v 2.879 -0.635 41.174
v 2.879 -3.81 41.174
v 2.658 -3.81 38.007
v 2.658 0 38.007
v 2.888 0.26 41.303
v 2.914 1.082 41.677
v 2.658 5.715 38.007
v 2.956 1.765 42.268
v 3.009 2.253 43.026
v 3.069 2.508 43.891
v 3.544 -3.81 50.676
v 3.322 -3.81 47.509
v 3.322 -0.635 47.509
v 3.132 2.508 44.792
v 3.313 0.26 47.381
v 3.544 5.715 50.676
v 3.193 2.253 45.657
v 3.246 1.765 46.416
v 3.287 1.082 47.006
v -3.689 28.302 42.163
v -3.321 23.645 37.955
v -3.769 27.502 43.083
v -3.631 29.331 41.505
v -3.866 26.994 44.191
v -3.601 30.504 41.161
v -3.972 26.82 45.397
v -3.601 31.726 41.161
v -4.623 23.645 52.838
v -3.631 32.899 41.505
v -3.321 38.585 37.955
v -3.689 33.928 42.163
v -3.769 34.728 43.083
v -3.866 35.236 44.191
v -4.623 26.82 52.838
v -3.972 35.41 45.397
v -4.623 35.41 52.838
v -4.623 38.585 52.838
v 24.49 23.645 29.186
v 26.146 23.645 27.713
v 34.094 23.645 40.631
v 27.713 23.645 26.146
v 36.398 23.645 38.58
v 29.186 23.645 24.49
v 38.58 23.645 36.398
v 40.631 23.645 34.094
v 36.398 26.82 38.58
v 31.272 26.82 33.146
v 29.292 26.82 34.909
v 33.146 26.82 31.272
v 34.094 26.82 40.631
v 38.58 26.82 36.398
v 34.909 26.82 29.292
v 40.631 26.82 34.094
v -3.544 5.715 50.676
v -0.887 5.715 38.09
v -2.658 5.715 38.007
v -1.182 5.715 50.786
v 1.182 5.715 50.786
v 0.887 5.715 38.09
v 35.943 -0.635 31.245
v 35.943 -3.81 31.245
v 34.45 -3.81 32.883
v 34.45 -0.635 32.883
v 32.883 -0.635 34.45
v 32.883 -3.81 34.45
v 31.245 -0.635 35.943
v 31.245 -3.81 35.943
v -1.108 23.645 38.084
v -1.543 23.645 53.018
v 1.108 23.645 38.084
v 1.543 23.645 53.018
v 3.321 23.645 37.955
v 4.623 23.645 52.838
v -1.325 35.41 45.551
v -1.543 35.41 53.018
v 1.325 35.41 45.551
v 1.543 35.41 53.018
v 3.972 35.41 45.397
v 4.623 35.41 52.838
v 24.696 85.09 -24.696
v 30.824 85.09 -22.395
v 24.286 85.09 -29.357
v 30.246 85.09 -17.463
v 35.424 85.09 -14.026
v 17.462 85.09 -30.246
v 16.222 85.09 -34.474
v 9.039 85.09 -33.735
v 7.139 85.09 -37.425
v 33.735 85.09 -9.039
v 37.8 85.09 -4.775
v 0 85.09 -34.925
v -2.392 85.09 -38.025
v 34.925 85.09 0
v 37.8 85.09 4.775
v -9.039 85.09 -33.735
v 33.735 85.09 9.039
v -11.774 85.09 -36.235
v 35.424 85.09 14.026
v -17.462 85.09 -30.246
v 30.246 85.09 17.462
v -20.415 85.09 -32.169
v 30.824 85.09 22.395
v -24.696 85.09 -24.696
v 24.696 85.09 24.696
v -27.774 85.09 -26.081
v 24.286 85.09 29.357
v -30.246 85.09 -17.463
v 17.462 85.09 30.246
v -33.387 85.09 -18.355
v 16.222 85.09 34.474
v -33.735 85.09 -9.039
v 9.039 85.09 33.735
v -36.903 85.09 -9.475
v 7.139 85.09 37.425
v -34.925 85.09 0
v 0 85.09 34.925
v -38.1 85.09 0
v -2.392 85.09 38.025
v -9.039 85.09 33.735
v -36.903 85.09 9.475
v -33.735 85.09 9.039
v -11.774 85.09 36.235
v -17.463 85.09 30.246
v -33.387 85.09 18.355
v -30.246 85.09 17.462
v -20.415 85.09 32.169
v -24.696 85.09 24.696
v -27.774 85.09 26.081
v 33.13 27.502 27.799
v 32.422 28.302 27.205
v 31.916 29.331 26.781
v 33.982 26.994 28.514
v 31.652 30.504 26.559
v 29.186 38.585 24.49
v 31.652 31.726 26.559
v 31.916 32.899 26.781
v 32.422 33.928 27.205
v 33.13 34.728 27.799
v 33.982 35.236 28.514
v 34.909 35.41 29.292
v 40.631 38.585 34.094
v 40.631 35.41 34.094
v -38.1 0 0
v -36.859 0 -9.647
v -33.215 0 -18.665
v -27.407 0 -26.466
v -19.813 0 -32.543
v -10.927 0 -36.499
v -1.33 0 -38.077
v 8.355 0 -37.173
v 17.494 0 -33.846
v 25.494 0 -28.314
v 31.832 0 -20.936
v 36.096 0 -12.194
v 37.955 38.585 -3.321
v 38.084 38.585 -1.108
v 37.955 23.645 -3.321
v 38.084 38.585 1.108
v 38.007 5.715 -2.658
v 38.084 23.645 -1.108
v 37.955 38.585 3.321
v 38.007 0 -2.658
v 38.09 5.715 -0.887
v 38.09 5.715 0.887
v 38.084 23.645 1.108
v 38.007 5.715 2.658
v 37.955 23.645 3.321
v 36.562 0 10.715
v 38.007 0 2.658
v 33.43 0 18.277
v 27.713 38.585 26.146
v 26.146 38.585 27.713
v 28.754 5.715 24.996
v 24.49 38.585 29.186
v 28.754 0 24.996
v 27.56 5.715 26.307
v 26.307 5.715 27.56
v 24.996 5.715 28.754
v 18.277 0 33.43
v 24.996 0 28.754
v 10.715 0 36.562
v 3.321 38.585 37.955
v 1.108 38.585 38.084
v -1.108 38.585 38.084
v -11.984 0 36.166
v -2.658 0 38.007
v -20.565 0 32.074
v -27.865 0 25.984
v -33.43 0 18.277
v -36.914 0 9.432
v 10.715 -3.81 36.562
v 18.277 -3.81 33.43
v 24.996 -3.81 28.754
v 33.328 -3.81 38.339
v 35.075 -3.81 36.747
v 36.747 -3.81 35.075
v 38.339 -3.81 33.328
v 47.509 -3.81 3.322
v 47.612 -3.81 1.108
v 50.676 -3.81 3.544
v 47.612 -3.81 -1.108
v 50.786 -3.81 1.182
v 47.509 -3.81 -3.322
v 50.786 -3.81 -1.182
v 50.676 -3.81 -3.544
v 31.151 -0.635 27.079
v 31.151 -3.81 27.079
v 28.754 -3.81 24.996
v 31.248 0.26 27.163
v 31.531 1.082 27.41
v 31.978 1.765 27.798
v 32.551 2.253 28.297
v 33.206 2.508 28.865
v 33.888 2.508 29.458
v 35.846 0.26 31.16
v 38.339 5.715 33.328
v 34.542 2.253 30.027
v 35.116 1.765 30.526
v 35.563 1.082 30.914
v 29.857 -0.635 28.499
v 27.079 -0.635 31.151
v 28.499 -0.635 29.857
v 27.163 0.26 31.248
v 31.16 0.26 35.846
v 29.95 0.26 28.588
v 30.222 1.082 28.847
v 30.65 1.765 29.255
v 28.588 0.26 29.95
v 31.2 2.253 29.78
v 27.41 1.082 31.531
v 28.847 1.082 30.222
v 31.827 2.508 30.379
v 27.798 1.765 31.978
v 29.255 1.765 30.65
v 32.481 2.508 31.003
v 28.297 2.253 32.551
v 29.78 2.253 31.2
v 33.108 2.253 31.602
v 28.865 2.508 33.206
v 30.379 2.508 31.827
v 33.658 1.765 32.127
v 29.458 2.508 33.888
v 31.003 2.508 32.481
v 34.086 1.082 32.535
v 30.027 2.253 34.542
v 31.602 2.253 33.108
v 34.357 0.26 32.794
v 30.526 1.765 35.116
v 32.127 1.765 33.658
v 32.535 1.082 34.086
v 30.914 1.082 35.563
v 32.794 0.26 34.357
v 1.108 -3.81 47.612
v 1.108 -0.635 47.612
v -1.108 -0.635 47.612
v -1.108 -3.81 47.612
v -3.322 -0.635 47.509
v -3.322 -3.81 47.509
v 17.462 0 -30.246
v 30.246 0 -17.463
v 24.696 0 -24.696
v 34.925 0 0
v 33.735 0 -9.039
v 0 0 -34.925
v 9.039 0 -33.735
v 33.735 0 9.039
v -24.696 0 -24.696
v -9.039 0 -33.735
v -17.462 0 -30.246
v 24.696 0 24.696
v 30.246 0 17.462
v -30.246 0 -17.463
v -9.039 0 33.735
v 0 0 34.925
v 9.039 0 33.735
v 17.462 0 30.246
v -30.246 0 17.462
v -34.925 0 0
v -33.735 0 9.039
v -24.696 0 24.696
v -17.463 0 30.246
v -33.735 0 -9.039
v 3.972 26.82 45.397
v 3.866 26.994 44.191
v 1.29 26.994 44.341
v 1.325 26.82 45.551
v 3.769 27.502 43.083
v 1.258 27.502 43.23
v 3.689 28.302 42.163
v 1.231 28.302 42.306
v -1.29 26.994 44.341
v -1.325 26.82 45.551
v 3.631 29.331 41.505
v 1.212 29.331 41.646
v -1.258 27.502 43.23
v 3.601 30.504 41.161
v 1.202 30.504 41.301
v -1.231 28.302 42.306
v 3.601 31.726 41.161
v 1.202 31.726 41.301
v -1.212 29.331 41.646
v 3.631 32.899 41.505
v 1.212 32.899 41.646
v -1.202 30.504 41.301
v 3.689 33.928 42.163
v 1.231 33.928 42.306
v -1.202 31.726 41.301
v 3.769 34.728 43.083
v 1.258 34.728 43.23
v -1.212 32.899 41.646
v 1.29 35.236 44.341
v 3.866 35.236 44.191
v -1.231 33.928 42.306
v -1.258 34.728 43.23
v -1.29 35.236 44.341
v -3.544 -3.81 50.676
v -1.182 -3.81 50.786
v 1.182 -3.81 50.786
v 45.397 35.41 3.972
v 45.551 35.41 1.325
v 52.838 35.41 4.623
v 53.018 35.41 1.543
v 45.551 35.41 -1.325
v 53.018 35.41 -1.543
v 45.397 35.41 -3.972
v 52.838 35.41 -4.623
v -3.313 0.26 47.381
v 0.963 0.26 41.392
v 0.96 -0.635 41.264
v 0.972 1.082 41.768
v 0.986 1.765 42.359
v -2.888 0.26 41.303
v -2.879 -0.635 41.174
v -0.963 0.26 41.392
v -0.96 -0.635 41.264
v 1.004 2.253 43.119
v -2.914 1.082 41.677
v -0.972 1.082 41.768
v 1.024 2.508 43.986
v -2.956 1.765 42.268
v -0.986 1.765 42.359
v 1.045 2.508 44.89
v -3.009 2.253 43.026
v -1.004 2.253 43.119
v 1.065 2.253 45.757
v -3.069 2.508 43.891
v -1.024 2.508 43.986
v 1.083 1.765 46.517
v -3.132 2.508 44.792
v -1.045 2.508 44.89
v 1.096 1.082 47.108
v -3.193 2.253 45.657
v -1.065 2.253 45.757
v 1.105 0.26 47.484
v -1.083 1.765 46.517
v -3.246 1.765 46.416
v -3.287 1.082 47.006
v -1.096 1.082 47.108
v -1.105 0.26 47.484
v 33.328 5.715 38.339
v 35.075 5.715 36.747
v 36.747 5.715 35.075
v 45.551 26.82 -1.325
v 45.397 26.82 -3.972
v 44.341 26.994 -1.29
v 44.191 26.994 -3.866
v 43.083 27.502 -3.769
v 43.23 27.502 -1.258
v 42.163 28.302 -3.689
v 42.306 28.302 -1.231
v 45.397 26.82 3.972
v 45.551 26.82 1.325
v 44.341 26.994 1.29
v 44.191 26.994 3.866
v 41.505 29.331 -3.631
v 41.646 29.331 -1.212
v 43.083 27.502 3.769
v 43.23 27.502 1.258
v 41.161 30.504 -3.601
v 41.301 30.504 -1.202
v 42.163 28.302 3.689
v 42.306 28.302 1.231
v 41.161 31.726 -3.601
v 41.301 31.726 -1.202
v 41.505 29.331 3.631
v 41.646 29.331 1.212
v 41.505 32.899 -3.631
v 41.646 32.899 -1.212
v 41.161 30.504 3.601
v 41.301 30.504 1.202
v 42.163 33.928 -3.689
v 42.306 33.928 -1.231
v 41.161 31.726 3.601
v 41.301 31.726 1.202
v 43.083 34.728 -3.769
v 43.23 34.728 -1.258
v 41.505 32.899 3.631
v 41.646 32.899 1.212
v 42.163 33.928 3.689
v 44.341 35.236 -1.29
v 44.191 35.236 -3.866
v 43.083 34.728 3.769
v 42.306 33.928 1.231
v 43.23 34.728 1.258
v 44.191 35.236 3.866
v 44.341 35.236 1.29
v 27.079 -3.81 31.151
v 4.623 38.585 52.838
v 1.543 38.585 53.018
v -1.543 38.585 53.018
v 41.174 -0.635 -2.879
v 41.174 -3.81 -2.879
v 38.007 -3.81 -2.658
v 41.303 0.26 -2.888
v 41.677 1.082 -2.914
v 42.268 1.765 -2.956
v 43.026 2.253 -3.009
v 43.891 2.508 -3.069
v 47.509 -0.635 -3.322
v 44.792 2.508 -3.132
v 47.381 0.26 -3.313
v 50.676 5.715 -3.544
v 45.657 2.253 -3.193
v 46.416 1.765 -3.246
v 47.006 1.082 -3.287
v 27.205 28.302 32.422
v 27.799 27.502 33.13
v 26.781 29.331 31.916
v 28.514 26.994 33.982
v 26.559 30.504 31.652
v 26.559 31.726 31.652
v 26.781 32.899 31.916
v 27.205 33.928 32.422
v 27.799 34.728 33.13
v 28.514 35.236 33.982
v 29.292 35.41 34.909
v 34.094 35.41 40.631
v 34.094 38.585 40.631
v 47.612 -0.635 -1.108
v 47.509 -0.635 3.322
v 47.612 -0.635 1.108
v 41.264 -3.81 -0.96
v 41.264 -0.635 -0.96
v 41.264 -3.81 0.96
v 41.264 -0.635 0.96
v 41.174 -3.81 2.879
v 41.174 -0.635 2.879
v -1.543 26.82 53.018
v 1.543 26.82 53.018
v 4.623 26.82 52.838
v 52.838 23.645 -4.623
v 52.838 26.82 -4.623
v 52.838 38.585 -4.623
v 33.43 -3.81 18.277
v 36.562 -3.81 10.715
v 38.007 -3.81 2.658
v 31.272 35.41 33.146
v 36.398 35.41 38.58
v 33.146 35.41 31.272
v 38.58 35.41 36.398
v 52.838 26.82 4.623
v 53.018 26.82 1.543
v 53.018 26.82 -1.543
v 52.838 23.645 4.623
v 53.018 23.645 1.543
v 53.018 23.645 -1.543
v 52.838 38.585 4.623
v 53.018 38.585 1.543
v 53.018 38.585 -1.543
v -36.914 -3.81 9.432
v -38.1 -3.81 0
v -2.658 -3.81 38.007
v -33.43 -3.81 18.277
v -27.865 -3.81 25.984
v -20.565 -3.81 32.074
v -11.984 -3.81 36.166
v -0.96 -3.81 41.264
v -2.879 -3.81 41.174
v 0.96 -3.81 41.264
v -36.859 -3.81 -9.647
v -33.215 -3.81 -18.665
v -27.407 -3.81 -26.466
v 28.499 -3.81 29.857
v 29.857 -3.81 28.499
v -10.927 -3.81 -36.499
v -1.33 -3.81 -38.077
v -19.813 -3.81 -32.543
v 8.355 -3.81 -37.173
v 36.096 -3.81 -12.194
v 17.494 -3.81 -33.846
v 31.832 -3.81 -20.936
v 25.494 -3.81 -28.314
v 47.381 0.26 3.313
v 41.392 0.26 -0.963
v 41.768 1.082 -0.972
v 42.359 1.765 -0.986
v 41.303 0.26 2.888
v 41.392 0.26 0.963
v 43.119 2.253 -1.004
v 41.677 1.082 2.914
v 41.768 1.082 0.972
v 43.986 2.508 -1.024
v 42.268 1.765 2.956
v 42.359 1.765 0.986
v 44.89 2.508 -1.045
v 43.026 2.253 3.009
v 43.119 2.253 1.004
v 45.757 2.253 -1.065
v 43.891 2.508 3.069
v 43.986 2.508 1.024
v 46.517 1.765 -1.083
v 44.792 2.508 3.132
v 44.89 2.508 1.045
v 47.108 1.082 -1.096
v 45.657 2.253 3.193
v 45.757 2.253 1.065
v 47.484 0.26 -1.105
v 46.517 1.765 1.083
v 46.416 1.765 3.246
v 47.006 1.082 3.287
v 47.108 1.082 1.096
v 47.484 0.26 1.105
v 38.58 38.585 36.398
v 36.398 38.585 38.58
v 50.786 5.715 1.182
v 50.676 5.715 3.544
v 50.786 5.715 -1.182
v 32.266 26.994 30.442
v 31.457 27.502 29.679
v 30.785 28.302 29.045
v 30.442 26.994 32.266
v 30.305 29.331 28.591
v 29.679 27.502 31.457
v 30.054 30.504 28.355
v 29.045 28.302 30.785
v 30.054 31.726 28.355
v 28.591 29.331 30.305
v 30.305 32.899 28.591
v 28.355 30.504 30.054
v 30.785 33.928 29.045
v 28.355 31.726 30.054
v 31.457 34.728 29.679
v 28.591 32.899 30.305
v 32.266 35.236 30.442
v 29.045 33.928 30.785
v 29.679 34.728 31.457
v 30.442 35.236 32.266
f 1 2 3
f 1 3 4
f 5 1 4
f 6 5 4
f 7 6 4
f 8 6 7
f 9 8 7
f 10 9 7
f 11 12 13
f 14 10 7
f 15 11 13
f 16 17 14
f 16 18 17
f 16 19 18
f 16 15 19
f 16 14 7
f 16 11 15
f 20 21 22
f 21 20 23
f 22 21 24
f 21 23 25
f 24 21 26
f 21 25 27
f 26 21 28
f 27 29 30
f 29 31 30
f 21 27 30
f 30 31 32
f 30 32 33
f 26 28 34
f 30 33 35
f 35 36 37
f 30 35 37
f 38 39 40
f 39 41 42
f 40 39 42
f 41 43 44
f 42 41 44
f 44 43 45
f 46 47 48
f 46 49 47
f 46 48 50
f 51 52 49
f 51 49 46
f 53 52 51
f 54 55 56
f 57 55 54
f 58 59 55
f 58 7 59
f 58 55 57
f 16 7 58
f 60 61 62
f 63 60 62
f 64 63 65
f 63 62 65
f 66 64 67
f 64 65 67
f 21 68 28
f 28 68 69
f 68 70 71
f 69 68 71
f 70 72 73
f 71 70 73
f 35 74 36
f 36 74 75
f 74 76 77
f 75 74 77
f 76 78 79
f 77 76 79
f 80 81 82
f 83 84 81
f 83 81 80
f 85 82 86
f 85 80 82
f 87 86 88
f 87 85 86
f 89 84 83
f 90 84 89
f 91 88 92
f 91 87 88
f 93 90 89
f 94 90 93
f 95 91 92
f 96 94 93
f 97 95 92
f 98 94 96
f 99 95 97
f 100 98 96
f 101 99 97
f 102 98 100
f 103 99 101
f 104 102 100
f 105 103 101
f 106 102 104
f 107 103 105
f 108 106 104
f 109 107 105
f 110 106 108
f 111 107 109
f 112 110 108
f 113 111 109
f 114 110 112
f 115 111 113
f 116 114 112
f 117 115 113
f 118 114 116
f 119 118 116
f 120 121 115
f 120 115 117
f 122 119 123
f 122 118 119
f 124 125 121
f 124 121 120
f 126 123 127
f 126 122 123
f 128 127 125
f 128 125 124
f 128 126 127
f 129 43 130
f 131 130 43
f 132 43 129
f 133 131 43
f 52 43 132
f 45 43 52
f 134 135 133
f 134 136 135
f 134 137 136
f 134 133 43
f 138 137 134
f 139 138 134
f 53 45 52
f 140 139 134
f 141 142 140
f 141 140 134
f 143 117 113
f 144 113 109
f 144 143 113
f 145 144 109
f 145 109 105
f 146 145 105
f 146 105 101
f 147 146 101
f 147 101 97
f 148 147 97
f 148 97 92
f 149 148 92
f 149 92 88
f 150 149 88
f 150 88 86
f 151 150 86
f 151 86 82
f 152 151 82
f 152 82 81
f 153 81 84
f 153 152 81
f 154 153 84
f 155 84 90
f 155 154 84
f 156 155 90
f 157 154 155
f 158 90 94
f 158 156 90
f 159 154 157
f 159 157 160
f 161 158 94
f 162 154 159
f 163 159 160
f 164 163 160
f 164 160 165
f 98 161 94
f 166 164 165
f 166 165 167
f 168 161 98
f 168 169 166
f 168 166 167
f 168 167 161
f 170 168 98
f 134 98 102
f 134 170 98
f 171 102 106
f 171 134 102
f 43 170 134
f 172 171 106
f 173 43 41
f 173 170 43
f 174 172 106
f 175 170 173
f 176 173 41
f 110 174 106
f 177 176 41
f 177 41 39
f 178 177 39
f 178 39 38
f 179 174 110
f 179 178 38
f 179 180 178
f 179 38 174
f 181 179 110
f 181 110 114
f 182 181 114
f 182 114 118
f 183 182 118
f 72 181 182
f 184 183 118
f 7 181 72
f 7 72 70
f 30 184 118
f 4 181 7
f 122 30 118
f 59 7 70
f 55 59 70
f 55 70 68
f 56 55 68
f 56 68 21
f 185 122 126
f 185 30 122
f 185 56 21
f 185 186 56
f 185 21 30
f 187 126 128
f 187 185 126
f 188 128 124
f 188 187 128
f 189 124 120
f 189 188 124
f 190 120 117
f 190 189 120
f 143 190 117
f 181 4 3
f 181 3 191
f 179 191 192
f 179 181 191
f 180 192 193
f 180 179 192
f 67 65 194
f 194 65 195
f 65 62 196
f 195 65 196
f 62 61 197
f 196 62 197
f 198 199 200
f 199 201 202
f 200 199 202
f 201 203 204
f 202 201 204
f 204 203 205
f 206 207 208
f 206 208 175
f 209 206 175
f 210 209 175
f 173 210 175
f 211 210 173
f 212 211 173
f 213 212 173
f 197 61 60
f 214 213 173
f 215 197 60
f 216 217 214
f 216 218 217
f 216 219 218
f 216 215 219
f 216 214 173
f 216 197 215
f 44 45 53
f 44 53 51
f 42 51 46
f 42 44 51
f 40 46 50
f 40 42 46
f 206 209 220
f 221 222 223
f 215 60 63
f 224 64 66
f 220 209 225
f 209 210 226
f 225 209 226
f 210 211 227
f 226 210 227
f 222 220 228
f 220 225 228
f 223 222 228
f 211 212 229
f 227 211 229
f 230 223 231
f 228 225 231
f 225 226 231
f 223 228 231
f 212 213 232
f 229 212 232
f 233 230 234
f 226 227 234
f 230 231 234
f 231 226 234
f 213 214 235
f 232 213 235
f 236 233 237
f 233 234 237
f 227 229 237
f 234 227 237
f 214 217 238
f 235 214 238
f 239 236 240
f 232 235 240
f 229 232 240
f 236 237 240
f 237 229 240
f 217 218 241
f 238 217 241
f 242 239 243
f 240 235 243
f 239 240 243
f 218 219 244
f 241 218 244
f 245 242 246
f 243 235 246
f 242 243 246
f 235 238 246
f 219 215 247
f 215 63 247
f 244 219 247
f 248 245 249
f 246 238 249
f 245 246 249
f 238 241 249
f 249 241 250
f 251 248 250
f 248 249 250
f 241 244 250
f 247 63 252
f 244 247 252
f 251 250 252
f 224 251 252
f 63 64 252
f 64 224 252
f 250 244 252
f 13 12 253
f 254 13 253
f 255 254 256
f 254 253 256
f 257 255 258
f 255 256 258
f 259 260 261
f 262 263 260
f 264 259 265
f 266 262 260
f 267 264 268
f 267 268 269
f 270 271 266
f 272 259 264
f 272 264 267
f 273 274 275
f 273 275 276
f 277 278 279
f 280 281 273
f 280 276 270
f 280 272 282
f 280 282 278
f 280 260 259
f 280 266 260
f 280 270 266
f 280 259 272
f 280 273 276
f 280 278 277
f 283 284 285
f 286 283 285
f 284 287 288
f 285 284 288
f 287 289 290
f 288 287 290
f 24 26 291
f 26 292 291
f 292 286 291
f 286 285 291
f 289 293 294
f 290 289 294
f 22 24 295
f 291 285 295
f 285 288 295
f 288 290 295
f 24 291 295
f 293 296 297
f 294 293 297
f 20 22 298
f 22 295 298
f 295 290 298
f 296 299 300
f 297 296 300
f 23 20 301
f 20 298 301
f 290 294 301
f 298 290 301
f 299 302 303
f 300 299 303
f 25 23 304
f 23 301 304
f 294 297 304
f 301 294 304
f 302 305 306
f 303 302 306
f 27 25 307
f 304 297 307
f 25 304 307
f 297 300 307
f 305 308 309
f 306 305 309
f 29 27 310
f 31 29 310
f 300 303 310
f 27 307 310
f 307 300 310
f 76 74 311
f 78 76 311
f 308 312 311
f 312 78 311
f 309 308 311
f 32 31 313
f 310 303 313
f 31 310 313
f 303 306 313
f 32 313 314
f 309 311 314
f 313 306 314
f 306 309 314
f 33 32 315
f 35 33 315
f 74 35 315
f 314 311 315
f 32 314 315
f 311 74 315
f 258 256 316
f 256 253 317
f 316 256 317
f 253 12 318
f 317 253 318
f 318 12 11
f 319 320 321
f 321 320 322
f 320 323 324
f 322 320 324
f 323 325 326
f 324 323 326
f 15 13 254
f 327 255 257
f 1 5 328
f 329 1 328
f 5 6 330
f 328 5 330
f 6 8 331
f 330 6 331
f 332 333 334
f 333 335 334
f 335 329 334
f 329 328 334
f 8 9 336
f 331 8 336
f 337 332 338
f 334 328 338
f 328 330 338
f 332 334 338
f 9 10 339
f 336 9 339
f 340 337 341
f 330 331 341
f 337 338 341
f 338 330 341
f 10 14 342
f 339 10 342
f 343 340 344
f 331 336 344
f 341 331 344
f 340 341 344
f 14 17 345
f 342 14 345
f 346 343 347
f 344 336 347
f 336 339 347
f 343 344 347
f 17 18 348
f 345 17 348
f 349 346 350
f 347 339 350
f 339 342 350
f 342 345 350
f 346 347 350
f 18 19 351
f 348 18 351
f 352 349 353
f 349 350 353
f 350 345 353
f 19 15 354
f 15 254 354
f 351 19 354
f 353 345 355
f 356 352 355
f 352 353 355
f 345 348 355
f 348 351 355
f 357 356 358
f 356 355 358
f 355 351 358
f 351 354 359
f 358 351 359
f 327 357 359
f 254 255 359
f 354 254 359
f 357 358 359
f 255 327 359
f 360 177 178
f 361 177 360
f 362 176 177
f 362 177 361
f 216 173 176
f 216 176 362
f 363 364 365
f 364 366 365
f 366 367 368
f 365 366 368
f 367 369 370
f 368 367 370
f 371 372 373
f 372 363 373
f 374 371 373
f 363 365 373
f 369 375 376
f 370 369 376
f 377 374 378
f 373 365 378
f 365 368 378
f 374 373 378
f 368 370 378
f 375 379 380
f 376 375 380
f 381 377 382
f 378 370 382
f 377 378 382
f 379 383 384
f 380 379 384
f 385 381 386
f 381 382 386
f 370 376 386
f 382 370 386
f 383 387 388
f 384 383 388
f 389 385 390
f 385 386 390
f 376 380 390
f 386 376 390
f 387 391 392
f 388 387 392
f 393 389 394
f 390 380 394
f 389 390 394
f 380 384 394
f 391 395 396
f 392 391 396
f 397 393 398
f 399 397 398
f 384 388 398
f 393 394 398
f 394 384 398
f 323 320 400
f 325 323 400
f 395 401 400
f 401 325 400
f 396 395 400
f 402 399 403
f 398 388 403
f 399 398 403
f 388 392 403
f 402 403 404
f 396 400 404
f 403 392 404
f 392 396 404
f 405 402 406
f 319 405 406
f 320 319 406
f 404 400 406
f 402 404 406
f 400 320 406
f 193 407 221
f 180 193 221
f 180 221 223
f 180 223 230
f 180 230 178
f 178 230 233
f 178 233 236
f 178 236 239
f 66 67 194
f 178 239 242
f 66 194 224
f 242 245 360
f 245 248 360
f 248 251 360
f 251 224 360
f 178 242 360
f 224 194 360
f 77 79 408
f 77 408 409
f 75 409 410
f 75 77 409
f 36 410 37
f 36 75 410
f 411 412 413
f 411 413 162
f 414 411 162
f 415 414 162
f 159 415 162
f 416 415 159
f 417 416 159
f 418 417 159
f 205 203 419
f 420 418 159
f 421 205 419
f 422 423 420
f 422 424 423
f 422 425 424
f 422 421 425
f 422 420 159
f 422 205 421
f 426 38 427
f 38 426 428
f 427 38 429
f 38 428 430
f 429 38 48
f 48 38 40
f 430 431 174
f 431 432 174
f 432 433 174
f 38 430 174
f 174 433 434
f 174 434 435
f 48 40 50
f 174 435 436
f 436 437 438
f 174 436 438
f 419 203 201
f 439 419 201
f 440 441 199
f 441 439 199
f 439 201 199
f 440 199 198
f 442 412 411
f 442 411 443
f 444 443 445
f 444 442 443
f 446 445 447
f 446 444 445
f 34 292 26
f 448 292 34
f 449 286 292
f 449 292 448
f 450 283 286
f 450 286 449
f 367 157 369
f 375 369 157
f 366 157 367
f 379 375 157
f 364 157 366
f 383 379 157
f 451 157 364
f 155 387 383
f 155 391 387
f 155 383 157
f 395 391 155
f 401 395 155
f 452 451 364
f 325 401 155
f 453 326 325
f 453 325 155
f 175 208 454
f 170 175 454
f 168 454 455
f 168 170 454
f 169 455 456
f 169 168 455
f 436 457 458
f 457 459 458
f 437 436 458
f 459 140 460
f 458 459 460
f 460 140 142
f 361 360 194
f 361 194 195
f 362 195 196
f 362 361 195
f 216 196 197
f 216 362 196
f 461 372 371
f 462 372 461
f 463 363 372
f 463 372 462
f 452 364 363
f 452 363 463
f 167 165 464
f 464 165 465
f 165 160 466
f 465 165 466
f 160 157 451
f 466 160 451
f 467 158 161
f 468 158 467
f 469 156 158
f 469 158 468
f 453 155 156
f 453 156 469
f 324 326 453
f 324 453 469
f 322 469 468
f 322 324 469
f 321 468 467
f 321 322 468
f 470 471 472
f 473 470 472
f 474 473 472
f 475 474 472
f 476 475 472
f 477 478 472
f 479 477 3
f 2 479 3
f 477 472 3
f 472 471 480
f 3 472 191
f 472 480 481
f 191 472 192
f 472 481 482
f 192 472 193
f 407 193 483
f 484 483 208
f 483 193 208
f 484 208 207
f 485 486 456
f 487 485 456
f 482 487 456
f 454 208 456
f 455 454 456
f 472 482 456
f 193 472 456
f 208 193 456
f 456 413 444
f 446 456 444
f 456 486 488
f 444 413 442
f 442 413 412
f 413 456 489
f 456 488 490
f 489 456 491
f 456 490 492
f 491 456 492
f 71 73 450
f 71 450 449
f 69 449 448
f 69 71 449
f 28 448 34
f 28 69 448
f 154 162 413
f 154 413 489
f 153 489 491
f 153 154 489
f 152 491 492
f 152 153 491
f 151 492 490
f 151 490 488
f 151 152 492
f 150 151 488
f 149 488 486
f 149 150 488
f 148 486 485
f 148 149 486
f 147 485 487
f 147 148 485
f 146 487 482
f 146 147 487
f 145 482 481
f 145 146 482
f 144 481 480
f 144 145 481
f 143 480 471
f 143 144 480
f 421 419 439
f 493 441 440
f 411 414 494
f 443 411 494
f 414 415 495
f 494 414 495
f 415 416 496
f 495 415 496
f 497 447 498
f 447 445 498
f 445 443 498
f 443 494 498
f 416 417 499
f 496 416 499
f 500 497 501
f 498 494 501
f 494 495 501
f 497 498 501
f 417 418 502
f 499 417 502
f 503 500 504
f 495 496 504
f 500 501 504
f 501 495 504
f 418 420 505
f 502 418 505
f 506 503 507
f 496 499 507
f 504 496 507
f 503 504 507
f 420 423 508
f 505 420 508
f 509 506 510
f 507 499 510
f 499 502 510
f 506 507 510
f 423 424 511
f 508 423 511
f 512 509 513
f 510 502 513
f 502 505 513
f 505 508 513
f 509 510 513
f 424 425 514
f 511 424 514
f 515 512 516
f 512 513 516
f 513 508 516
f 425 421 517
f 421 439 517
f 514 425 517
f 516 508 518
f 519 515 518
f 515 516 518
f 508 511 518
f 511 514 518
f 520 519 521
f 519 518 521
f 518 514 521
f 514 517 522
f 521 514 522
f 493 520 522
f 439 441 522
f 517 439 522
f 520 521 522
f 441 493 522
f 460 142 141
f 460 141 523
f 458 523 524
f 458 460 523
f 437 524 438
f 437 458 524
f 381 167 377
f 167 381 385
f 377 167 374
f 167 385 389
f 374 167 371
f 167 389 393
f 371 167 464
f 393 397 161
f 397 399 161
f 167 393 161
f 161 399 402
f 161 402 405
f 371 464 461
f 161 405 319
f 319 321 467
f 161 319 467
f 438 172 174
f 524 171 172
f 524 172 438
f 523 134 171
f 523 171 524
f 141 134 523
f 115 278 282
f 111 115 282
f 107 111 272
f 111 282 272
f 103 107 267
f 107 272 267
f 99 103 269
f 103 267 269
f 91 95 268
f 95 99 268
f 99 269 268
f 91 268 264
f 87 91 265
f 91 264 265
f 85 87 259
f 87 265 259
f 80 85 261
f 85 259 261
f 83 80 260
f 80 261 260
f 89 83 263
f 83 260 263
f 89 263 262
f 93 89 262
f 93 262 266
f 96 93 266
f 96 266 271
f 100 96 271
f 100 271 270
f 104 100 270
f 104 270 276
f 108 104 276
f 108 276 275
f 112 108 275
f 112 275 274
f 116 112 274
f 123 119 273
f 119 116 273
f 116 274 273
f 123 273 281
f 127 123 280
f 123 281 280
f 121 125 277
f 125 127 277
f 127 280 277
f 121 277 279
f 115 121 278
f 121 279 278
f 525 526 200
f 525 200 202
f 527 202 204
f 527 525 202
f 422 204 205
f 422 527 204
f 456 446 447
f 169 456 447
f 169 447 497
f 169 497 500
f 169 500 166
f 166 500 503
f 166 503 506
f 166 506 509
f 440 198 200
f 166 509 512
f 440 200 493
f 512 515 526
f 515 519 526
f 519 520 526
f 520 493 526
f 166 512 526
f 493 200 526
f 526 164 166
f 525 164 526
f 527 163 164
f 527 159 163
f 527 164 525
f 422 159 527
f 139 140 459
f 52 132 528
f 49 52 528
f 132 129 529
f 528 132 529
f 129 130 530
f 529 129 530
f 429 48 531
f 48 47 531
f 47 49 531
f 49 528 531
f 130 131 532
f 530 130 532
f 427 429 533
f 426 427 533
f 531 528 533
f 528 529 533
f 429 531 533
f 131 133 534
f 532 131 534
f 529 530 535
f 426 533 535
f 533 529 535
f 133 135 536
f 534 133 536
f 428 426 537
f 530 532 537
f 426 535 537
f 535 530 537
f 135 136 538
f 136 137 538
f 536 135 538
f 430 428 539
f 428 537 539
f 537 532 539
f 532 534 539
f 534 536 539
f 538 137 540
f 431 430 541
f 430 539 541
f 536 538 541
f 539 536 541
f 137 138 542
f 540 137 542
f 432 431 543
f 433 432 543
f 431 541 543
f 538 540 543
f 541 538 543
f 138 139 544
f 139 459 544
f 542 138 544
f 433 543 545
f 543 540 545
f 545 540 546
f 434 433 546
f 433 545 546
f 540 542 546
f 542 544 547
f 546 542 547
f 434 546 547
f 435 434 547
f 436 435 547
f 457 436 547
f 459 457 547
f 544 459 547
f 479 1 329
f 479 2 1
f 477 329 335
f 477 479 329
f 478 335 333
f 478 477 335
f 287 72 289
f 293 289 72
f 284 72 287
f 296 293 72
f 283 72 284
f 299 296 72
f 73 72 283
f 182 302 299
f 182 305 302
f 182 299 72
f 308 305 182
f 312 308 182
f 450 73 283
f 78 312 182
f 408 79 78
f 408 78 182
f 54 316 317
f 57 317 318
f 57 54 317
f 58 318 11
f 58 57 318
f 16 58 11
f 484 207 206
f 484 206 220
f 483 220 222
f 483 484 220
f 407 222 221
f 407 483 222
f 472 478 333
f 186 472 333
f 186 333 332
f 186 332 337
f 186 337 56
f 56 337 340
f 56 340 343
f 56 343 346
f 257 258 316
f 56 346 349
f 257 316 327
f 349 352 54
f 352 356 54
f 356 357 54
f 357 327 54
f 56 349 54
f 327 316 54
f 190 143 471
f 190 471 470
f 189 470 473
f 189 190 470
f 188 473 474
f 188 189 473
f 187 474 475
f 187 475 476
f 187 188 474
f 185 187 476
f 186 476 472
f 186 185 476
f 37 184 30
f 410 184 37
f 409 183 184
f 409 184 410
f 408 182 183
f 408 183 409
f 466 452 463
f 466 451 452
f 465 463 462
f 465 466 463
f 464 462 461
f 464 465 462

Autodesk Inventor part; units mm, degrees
ref_plane "YZ Plane" through (0, 0, 0) normal (1, 0, 0) x (0, 1, 0)
ref_plane "XZ Plane" through (0, 0, 0) normal (0, 1, 0) x (-1, 0, 0)
ref_plane "XY Plane" through (0, 0, 0) normal (0, 0, 1) x (1, 0, 0)
sketch "Sketch8" plane through (0, 0, 0) normal (0, 1, 0) x (-1, 0, 0)
  circle A0 centre (0, 0) radius 38.1
  circle A1 centre (0, 0) radius 34.925
  dimension "d25" = 76.2
  dimension "d26" = 3.175
extrude "Extrusion6" add sketch "Sketch8" against normal blind 3.81 contours A0 | A1
extrude "Extrusion7" add sketch "Sketch8" along normal blind 85.09
sketch "Sketch9" plane through (0, -3.81, 0) normal (0, -1, 0) x (1, 0, 0)
  point P0 (0, 0)
sketch "Sketch10" plane through (0, 0, 0) normal (1, 0, 0) x (0, 1, 0)
  line L0 (85.09, 38.1) -> (-3.81, 38.1) projected
  line L1 (-3.81, 38.1) -> (-3.81, 50.8)
  line L2 (-3.81, 50.8) -> (5.715, 50.8)
  line L3 (5.715, 50.8) -> (5.715, 38.1)
  arc A0 (-0.635, 41.275) -> (-0.635, 47.625) centre (-0.635, 44.45) ccw
  line L4 (-3.81, 38.1) -> (-3.81, -38.1) projected
  line L5 (-0.635, 47.625) -> (-3.81, 47.625)
  line L6 (-0.635, 41.275) -> (-3.81, 41.275)
  line L7 (-16.51, 0) -> (72.39, 0) projected
  point P0 (0, 0)
  dimension "d31" = 6.35
  dimension "d32" = 3.175
  dimension "d35" = 3.175
  dimension "d36" = 3.175
revolve "Revolution1" add sketch "Sketch10" angle 8 mid plane about axis through (0, -10, 0) along (0, 1, 0) contours L0 L1 L6 A0 L5 L2 L3
sketch "Sketch11" plane through (0, 0, 0) normal (1, 0, 0) x (0, 1, 0)
  line L0 (85.09, 38.1) -> (5.715, 38.1) projected
  arc A0 (26.8199, 45.5701) -> (35.4101, 45.5701) centre (31.115, 45.5701) ccw
  line L1 (38.5851, 38.1) -> (38.5851, 53.0402)
  line L2 (23.6449, 53.0402) -> (23.6449, 38.1)
  line L3 (35.4101, 45.5701) -> (35.4101, 53.0402)
  line L4 (26.8199, 45.5701) -> (26.8199, 53.0402)
  line L5 (38.5851, 53.0402) -> (35.4101, 53.0402)
  line L6 (26.8199, 53.0402) -> (23.6449, 53.0402)
  line L7 (-16.51, 0) -> (72.39, 0) projected
  arc A1 (2.54, 44.45) -> (-0.635, 47.625) centre (-0.635, 44.45) ccw projected
  arc A2 (-0.635, 41.275) -> (2.54, 44.45) centre (-0.635, 44.45) ccw projected
  point P0 (0, 0)
  dimension "d38" = 8.5902
  dimension "d39" = 3.175
  dimension "d40" = 3.175
  dimension "d41" = 3.175
  dimension "d44" = 31.75
revolve "Revolution2" add sketch "Sketch11" angle 10 mid plane about axis through (0, -10, 0) along (0, 1, 0)
pattern_circular "Circular Pattern2" count 3 over 90 about axis through (0, -10, 0) along (0, 1, 0) of "Revolution2", "Revolution1"
equation "\"d25\" = outerDiameter"
equation "\"d26\" = wallThickness"
equation "\"d27\" = floorThickness"
equation "\"d29\" = height - floorThickness"
equation "\"d31\" = holeDiameter"
equation "\"d32\" = fromWallToHole"
equation "\"d35\" = fromEdgeToWall"
equation "\"d36\" = htAboveHole"
equation "\"d39\" = fromWallToHole"
equation "\"d40\" = htAboveHole"
equation "\"d41\" = htAboveHole"
equation "\"d44\" = spaceBetweenWire"
equation "\"htAboveHole\" = 3.175"
equation "\"fromWallToHole\" = 3.175"
equation "\"fromEdgeToWall\" = 3.175"
equation "\"holeDiameter\" = 6.35"
equation "\"bottomHeight\" = holeDiameter + htAboveHole"
equation "\"d42\" = fromEdgeToWall"
equation "\"outerDiameter\" = 76.2"
equation "\"floorThickness\" = 3.81"
equation "\"wallThickness\" = 3.175"
equation "\"spaceBetweenWire\" = 31.75"
equation "\"height\" = 88.9"
properties part number "roundMouseSupport"
